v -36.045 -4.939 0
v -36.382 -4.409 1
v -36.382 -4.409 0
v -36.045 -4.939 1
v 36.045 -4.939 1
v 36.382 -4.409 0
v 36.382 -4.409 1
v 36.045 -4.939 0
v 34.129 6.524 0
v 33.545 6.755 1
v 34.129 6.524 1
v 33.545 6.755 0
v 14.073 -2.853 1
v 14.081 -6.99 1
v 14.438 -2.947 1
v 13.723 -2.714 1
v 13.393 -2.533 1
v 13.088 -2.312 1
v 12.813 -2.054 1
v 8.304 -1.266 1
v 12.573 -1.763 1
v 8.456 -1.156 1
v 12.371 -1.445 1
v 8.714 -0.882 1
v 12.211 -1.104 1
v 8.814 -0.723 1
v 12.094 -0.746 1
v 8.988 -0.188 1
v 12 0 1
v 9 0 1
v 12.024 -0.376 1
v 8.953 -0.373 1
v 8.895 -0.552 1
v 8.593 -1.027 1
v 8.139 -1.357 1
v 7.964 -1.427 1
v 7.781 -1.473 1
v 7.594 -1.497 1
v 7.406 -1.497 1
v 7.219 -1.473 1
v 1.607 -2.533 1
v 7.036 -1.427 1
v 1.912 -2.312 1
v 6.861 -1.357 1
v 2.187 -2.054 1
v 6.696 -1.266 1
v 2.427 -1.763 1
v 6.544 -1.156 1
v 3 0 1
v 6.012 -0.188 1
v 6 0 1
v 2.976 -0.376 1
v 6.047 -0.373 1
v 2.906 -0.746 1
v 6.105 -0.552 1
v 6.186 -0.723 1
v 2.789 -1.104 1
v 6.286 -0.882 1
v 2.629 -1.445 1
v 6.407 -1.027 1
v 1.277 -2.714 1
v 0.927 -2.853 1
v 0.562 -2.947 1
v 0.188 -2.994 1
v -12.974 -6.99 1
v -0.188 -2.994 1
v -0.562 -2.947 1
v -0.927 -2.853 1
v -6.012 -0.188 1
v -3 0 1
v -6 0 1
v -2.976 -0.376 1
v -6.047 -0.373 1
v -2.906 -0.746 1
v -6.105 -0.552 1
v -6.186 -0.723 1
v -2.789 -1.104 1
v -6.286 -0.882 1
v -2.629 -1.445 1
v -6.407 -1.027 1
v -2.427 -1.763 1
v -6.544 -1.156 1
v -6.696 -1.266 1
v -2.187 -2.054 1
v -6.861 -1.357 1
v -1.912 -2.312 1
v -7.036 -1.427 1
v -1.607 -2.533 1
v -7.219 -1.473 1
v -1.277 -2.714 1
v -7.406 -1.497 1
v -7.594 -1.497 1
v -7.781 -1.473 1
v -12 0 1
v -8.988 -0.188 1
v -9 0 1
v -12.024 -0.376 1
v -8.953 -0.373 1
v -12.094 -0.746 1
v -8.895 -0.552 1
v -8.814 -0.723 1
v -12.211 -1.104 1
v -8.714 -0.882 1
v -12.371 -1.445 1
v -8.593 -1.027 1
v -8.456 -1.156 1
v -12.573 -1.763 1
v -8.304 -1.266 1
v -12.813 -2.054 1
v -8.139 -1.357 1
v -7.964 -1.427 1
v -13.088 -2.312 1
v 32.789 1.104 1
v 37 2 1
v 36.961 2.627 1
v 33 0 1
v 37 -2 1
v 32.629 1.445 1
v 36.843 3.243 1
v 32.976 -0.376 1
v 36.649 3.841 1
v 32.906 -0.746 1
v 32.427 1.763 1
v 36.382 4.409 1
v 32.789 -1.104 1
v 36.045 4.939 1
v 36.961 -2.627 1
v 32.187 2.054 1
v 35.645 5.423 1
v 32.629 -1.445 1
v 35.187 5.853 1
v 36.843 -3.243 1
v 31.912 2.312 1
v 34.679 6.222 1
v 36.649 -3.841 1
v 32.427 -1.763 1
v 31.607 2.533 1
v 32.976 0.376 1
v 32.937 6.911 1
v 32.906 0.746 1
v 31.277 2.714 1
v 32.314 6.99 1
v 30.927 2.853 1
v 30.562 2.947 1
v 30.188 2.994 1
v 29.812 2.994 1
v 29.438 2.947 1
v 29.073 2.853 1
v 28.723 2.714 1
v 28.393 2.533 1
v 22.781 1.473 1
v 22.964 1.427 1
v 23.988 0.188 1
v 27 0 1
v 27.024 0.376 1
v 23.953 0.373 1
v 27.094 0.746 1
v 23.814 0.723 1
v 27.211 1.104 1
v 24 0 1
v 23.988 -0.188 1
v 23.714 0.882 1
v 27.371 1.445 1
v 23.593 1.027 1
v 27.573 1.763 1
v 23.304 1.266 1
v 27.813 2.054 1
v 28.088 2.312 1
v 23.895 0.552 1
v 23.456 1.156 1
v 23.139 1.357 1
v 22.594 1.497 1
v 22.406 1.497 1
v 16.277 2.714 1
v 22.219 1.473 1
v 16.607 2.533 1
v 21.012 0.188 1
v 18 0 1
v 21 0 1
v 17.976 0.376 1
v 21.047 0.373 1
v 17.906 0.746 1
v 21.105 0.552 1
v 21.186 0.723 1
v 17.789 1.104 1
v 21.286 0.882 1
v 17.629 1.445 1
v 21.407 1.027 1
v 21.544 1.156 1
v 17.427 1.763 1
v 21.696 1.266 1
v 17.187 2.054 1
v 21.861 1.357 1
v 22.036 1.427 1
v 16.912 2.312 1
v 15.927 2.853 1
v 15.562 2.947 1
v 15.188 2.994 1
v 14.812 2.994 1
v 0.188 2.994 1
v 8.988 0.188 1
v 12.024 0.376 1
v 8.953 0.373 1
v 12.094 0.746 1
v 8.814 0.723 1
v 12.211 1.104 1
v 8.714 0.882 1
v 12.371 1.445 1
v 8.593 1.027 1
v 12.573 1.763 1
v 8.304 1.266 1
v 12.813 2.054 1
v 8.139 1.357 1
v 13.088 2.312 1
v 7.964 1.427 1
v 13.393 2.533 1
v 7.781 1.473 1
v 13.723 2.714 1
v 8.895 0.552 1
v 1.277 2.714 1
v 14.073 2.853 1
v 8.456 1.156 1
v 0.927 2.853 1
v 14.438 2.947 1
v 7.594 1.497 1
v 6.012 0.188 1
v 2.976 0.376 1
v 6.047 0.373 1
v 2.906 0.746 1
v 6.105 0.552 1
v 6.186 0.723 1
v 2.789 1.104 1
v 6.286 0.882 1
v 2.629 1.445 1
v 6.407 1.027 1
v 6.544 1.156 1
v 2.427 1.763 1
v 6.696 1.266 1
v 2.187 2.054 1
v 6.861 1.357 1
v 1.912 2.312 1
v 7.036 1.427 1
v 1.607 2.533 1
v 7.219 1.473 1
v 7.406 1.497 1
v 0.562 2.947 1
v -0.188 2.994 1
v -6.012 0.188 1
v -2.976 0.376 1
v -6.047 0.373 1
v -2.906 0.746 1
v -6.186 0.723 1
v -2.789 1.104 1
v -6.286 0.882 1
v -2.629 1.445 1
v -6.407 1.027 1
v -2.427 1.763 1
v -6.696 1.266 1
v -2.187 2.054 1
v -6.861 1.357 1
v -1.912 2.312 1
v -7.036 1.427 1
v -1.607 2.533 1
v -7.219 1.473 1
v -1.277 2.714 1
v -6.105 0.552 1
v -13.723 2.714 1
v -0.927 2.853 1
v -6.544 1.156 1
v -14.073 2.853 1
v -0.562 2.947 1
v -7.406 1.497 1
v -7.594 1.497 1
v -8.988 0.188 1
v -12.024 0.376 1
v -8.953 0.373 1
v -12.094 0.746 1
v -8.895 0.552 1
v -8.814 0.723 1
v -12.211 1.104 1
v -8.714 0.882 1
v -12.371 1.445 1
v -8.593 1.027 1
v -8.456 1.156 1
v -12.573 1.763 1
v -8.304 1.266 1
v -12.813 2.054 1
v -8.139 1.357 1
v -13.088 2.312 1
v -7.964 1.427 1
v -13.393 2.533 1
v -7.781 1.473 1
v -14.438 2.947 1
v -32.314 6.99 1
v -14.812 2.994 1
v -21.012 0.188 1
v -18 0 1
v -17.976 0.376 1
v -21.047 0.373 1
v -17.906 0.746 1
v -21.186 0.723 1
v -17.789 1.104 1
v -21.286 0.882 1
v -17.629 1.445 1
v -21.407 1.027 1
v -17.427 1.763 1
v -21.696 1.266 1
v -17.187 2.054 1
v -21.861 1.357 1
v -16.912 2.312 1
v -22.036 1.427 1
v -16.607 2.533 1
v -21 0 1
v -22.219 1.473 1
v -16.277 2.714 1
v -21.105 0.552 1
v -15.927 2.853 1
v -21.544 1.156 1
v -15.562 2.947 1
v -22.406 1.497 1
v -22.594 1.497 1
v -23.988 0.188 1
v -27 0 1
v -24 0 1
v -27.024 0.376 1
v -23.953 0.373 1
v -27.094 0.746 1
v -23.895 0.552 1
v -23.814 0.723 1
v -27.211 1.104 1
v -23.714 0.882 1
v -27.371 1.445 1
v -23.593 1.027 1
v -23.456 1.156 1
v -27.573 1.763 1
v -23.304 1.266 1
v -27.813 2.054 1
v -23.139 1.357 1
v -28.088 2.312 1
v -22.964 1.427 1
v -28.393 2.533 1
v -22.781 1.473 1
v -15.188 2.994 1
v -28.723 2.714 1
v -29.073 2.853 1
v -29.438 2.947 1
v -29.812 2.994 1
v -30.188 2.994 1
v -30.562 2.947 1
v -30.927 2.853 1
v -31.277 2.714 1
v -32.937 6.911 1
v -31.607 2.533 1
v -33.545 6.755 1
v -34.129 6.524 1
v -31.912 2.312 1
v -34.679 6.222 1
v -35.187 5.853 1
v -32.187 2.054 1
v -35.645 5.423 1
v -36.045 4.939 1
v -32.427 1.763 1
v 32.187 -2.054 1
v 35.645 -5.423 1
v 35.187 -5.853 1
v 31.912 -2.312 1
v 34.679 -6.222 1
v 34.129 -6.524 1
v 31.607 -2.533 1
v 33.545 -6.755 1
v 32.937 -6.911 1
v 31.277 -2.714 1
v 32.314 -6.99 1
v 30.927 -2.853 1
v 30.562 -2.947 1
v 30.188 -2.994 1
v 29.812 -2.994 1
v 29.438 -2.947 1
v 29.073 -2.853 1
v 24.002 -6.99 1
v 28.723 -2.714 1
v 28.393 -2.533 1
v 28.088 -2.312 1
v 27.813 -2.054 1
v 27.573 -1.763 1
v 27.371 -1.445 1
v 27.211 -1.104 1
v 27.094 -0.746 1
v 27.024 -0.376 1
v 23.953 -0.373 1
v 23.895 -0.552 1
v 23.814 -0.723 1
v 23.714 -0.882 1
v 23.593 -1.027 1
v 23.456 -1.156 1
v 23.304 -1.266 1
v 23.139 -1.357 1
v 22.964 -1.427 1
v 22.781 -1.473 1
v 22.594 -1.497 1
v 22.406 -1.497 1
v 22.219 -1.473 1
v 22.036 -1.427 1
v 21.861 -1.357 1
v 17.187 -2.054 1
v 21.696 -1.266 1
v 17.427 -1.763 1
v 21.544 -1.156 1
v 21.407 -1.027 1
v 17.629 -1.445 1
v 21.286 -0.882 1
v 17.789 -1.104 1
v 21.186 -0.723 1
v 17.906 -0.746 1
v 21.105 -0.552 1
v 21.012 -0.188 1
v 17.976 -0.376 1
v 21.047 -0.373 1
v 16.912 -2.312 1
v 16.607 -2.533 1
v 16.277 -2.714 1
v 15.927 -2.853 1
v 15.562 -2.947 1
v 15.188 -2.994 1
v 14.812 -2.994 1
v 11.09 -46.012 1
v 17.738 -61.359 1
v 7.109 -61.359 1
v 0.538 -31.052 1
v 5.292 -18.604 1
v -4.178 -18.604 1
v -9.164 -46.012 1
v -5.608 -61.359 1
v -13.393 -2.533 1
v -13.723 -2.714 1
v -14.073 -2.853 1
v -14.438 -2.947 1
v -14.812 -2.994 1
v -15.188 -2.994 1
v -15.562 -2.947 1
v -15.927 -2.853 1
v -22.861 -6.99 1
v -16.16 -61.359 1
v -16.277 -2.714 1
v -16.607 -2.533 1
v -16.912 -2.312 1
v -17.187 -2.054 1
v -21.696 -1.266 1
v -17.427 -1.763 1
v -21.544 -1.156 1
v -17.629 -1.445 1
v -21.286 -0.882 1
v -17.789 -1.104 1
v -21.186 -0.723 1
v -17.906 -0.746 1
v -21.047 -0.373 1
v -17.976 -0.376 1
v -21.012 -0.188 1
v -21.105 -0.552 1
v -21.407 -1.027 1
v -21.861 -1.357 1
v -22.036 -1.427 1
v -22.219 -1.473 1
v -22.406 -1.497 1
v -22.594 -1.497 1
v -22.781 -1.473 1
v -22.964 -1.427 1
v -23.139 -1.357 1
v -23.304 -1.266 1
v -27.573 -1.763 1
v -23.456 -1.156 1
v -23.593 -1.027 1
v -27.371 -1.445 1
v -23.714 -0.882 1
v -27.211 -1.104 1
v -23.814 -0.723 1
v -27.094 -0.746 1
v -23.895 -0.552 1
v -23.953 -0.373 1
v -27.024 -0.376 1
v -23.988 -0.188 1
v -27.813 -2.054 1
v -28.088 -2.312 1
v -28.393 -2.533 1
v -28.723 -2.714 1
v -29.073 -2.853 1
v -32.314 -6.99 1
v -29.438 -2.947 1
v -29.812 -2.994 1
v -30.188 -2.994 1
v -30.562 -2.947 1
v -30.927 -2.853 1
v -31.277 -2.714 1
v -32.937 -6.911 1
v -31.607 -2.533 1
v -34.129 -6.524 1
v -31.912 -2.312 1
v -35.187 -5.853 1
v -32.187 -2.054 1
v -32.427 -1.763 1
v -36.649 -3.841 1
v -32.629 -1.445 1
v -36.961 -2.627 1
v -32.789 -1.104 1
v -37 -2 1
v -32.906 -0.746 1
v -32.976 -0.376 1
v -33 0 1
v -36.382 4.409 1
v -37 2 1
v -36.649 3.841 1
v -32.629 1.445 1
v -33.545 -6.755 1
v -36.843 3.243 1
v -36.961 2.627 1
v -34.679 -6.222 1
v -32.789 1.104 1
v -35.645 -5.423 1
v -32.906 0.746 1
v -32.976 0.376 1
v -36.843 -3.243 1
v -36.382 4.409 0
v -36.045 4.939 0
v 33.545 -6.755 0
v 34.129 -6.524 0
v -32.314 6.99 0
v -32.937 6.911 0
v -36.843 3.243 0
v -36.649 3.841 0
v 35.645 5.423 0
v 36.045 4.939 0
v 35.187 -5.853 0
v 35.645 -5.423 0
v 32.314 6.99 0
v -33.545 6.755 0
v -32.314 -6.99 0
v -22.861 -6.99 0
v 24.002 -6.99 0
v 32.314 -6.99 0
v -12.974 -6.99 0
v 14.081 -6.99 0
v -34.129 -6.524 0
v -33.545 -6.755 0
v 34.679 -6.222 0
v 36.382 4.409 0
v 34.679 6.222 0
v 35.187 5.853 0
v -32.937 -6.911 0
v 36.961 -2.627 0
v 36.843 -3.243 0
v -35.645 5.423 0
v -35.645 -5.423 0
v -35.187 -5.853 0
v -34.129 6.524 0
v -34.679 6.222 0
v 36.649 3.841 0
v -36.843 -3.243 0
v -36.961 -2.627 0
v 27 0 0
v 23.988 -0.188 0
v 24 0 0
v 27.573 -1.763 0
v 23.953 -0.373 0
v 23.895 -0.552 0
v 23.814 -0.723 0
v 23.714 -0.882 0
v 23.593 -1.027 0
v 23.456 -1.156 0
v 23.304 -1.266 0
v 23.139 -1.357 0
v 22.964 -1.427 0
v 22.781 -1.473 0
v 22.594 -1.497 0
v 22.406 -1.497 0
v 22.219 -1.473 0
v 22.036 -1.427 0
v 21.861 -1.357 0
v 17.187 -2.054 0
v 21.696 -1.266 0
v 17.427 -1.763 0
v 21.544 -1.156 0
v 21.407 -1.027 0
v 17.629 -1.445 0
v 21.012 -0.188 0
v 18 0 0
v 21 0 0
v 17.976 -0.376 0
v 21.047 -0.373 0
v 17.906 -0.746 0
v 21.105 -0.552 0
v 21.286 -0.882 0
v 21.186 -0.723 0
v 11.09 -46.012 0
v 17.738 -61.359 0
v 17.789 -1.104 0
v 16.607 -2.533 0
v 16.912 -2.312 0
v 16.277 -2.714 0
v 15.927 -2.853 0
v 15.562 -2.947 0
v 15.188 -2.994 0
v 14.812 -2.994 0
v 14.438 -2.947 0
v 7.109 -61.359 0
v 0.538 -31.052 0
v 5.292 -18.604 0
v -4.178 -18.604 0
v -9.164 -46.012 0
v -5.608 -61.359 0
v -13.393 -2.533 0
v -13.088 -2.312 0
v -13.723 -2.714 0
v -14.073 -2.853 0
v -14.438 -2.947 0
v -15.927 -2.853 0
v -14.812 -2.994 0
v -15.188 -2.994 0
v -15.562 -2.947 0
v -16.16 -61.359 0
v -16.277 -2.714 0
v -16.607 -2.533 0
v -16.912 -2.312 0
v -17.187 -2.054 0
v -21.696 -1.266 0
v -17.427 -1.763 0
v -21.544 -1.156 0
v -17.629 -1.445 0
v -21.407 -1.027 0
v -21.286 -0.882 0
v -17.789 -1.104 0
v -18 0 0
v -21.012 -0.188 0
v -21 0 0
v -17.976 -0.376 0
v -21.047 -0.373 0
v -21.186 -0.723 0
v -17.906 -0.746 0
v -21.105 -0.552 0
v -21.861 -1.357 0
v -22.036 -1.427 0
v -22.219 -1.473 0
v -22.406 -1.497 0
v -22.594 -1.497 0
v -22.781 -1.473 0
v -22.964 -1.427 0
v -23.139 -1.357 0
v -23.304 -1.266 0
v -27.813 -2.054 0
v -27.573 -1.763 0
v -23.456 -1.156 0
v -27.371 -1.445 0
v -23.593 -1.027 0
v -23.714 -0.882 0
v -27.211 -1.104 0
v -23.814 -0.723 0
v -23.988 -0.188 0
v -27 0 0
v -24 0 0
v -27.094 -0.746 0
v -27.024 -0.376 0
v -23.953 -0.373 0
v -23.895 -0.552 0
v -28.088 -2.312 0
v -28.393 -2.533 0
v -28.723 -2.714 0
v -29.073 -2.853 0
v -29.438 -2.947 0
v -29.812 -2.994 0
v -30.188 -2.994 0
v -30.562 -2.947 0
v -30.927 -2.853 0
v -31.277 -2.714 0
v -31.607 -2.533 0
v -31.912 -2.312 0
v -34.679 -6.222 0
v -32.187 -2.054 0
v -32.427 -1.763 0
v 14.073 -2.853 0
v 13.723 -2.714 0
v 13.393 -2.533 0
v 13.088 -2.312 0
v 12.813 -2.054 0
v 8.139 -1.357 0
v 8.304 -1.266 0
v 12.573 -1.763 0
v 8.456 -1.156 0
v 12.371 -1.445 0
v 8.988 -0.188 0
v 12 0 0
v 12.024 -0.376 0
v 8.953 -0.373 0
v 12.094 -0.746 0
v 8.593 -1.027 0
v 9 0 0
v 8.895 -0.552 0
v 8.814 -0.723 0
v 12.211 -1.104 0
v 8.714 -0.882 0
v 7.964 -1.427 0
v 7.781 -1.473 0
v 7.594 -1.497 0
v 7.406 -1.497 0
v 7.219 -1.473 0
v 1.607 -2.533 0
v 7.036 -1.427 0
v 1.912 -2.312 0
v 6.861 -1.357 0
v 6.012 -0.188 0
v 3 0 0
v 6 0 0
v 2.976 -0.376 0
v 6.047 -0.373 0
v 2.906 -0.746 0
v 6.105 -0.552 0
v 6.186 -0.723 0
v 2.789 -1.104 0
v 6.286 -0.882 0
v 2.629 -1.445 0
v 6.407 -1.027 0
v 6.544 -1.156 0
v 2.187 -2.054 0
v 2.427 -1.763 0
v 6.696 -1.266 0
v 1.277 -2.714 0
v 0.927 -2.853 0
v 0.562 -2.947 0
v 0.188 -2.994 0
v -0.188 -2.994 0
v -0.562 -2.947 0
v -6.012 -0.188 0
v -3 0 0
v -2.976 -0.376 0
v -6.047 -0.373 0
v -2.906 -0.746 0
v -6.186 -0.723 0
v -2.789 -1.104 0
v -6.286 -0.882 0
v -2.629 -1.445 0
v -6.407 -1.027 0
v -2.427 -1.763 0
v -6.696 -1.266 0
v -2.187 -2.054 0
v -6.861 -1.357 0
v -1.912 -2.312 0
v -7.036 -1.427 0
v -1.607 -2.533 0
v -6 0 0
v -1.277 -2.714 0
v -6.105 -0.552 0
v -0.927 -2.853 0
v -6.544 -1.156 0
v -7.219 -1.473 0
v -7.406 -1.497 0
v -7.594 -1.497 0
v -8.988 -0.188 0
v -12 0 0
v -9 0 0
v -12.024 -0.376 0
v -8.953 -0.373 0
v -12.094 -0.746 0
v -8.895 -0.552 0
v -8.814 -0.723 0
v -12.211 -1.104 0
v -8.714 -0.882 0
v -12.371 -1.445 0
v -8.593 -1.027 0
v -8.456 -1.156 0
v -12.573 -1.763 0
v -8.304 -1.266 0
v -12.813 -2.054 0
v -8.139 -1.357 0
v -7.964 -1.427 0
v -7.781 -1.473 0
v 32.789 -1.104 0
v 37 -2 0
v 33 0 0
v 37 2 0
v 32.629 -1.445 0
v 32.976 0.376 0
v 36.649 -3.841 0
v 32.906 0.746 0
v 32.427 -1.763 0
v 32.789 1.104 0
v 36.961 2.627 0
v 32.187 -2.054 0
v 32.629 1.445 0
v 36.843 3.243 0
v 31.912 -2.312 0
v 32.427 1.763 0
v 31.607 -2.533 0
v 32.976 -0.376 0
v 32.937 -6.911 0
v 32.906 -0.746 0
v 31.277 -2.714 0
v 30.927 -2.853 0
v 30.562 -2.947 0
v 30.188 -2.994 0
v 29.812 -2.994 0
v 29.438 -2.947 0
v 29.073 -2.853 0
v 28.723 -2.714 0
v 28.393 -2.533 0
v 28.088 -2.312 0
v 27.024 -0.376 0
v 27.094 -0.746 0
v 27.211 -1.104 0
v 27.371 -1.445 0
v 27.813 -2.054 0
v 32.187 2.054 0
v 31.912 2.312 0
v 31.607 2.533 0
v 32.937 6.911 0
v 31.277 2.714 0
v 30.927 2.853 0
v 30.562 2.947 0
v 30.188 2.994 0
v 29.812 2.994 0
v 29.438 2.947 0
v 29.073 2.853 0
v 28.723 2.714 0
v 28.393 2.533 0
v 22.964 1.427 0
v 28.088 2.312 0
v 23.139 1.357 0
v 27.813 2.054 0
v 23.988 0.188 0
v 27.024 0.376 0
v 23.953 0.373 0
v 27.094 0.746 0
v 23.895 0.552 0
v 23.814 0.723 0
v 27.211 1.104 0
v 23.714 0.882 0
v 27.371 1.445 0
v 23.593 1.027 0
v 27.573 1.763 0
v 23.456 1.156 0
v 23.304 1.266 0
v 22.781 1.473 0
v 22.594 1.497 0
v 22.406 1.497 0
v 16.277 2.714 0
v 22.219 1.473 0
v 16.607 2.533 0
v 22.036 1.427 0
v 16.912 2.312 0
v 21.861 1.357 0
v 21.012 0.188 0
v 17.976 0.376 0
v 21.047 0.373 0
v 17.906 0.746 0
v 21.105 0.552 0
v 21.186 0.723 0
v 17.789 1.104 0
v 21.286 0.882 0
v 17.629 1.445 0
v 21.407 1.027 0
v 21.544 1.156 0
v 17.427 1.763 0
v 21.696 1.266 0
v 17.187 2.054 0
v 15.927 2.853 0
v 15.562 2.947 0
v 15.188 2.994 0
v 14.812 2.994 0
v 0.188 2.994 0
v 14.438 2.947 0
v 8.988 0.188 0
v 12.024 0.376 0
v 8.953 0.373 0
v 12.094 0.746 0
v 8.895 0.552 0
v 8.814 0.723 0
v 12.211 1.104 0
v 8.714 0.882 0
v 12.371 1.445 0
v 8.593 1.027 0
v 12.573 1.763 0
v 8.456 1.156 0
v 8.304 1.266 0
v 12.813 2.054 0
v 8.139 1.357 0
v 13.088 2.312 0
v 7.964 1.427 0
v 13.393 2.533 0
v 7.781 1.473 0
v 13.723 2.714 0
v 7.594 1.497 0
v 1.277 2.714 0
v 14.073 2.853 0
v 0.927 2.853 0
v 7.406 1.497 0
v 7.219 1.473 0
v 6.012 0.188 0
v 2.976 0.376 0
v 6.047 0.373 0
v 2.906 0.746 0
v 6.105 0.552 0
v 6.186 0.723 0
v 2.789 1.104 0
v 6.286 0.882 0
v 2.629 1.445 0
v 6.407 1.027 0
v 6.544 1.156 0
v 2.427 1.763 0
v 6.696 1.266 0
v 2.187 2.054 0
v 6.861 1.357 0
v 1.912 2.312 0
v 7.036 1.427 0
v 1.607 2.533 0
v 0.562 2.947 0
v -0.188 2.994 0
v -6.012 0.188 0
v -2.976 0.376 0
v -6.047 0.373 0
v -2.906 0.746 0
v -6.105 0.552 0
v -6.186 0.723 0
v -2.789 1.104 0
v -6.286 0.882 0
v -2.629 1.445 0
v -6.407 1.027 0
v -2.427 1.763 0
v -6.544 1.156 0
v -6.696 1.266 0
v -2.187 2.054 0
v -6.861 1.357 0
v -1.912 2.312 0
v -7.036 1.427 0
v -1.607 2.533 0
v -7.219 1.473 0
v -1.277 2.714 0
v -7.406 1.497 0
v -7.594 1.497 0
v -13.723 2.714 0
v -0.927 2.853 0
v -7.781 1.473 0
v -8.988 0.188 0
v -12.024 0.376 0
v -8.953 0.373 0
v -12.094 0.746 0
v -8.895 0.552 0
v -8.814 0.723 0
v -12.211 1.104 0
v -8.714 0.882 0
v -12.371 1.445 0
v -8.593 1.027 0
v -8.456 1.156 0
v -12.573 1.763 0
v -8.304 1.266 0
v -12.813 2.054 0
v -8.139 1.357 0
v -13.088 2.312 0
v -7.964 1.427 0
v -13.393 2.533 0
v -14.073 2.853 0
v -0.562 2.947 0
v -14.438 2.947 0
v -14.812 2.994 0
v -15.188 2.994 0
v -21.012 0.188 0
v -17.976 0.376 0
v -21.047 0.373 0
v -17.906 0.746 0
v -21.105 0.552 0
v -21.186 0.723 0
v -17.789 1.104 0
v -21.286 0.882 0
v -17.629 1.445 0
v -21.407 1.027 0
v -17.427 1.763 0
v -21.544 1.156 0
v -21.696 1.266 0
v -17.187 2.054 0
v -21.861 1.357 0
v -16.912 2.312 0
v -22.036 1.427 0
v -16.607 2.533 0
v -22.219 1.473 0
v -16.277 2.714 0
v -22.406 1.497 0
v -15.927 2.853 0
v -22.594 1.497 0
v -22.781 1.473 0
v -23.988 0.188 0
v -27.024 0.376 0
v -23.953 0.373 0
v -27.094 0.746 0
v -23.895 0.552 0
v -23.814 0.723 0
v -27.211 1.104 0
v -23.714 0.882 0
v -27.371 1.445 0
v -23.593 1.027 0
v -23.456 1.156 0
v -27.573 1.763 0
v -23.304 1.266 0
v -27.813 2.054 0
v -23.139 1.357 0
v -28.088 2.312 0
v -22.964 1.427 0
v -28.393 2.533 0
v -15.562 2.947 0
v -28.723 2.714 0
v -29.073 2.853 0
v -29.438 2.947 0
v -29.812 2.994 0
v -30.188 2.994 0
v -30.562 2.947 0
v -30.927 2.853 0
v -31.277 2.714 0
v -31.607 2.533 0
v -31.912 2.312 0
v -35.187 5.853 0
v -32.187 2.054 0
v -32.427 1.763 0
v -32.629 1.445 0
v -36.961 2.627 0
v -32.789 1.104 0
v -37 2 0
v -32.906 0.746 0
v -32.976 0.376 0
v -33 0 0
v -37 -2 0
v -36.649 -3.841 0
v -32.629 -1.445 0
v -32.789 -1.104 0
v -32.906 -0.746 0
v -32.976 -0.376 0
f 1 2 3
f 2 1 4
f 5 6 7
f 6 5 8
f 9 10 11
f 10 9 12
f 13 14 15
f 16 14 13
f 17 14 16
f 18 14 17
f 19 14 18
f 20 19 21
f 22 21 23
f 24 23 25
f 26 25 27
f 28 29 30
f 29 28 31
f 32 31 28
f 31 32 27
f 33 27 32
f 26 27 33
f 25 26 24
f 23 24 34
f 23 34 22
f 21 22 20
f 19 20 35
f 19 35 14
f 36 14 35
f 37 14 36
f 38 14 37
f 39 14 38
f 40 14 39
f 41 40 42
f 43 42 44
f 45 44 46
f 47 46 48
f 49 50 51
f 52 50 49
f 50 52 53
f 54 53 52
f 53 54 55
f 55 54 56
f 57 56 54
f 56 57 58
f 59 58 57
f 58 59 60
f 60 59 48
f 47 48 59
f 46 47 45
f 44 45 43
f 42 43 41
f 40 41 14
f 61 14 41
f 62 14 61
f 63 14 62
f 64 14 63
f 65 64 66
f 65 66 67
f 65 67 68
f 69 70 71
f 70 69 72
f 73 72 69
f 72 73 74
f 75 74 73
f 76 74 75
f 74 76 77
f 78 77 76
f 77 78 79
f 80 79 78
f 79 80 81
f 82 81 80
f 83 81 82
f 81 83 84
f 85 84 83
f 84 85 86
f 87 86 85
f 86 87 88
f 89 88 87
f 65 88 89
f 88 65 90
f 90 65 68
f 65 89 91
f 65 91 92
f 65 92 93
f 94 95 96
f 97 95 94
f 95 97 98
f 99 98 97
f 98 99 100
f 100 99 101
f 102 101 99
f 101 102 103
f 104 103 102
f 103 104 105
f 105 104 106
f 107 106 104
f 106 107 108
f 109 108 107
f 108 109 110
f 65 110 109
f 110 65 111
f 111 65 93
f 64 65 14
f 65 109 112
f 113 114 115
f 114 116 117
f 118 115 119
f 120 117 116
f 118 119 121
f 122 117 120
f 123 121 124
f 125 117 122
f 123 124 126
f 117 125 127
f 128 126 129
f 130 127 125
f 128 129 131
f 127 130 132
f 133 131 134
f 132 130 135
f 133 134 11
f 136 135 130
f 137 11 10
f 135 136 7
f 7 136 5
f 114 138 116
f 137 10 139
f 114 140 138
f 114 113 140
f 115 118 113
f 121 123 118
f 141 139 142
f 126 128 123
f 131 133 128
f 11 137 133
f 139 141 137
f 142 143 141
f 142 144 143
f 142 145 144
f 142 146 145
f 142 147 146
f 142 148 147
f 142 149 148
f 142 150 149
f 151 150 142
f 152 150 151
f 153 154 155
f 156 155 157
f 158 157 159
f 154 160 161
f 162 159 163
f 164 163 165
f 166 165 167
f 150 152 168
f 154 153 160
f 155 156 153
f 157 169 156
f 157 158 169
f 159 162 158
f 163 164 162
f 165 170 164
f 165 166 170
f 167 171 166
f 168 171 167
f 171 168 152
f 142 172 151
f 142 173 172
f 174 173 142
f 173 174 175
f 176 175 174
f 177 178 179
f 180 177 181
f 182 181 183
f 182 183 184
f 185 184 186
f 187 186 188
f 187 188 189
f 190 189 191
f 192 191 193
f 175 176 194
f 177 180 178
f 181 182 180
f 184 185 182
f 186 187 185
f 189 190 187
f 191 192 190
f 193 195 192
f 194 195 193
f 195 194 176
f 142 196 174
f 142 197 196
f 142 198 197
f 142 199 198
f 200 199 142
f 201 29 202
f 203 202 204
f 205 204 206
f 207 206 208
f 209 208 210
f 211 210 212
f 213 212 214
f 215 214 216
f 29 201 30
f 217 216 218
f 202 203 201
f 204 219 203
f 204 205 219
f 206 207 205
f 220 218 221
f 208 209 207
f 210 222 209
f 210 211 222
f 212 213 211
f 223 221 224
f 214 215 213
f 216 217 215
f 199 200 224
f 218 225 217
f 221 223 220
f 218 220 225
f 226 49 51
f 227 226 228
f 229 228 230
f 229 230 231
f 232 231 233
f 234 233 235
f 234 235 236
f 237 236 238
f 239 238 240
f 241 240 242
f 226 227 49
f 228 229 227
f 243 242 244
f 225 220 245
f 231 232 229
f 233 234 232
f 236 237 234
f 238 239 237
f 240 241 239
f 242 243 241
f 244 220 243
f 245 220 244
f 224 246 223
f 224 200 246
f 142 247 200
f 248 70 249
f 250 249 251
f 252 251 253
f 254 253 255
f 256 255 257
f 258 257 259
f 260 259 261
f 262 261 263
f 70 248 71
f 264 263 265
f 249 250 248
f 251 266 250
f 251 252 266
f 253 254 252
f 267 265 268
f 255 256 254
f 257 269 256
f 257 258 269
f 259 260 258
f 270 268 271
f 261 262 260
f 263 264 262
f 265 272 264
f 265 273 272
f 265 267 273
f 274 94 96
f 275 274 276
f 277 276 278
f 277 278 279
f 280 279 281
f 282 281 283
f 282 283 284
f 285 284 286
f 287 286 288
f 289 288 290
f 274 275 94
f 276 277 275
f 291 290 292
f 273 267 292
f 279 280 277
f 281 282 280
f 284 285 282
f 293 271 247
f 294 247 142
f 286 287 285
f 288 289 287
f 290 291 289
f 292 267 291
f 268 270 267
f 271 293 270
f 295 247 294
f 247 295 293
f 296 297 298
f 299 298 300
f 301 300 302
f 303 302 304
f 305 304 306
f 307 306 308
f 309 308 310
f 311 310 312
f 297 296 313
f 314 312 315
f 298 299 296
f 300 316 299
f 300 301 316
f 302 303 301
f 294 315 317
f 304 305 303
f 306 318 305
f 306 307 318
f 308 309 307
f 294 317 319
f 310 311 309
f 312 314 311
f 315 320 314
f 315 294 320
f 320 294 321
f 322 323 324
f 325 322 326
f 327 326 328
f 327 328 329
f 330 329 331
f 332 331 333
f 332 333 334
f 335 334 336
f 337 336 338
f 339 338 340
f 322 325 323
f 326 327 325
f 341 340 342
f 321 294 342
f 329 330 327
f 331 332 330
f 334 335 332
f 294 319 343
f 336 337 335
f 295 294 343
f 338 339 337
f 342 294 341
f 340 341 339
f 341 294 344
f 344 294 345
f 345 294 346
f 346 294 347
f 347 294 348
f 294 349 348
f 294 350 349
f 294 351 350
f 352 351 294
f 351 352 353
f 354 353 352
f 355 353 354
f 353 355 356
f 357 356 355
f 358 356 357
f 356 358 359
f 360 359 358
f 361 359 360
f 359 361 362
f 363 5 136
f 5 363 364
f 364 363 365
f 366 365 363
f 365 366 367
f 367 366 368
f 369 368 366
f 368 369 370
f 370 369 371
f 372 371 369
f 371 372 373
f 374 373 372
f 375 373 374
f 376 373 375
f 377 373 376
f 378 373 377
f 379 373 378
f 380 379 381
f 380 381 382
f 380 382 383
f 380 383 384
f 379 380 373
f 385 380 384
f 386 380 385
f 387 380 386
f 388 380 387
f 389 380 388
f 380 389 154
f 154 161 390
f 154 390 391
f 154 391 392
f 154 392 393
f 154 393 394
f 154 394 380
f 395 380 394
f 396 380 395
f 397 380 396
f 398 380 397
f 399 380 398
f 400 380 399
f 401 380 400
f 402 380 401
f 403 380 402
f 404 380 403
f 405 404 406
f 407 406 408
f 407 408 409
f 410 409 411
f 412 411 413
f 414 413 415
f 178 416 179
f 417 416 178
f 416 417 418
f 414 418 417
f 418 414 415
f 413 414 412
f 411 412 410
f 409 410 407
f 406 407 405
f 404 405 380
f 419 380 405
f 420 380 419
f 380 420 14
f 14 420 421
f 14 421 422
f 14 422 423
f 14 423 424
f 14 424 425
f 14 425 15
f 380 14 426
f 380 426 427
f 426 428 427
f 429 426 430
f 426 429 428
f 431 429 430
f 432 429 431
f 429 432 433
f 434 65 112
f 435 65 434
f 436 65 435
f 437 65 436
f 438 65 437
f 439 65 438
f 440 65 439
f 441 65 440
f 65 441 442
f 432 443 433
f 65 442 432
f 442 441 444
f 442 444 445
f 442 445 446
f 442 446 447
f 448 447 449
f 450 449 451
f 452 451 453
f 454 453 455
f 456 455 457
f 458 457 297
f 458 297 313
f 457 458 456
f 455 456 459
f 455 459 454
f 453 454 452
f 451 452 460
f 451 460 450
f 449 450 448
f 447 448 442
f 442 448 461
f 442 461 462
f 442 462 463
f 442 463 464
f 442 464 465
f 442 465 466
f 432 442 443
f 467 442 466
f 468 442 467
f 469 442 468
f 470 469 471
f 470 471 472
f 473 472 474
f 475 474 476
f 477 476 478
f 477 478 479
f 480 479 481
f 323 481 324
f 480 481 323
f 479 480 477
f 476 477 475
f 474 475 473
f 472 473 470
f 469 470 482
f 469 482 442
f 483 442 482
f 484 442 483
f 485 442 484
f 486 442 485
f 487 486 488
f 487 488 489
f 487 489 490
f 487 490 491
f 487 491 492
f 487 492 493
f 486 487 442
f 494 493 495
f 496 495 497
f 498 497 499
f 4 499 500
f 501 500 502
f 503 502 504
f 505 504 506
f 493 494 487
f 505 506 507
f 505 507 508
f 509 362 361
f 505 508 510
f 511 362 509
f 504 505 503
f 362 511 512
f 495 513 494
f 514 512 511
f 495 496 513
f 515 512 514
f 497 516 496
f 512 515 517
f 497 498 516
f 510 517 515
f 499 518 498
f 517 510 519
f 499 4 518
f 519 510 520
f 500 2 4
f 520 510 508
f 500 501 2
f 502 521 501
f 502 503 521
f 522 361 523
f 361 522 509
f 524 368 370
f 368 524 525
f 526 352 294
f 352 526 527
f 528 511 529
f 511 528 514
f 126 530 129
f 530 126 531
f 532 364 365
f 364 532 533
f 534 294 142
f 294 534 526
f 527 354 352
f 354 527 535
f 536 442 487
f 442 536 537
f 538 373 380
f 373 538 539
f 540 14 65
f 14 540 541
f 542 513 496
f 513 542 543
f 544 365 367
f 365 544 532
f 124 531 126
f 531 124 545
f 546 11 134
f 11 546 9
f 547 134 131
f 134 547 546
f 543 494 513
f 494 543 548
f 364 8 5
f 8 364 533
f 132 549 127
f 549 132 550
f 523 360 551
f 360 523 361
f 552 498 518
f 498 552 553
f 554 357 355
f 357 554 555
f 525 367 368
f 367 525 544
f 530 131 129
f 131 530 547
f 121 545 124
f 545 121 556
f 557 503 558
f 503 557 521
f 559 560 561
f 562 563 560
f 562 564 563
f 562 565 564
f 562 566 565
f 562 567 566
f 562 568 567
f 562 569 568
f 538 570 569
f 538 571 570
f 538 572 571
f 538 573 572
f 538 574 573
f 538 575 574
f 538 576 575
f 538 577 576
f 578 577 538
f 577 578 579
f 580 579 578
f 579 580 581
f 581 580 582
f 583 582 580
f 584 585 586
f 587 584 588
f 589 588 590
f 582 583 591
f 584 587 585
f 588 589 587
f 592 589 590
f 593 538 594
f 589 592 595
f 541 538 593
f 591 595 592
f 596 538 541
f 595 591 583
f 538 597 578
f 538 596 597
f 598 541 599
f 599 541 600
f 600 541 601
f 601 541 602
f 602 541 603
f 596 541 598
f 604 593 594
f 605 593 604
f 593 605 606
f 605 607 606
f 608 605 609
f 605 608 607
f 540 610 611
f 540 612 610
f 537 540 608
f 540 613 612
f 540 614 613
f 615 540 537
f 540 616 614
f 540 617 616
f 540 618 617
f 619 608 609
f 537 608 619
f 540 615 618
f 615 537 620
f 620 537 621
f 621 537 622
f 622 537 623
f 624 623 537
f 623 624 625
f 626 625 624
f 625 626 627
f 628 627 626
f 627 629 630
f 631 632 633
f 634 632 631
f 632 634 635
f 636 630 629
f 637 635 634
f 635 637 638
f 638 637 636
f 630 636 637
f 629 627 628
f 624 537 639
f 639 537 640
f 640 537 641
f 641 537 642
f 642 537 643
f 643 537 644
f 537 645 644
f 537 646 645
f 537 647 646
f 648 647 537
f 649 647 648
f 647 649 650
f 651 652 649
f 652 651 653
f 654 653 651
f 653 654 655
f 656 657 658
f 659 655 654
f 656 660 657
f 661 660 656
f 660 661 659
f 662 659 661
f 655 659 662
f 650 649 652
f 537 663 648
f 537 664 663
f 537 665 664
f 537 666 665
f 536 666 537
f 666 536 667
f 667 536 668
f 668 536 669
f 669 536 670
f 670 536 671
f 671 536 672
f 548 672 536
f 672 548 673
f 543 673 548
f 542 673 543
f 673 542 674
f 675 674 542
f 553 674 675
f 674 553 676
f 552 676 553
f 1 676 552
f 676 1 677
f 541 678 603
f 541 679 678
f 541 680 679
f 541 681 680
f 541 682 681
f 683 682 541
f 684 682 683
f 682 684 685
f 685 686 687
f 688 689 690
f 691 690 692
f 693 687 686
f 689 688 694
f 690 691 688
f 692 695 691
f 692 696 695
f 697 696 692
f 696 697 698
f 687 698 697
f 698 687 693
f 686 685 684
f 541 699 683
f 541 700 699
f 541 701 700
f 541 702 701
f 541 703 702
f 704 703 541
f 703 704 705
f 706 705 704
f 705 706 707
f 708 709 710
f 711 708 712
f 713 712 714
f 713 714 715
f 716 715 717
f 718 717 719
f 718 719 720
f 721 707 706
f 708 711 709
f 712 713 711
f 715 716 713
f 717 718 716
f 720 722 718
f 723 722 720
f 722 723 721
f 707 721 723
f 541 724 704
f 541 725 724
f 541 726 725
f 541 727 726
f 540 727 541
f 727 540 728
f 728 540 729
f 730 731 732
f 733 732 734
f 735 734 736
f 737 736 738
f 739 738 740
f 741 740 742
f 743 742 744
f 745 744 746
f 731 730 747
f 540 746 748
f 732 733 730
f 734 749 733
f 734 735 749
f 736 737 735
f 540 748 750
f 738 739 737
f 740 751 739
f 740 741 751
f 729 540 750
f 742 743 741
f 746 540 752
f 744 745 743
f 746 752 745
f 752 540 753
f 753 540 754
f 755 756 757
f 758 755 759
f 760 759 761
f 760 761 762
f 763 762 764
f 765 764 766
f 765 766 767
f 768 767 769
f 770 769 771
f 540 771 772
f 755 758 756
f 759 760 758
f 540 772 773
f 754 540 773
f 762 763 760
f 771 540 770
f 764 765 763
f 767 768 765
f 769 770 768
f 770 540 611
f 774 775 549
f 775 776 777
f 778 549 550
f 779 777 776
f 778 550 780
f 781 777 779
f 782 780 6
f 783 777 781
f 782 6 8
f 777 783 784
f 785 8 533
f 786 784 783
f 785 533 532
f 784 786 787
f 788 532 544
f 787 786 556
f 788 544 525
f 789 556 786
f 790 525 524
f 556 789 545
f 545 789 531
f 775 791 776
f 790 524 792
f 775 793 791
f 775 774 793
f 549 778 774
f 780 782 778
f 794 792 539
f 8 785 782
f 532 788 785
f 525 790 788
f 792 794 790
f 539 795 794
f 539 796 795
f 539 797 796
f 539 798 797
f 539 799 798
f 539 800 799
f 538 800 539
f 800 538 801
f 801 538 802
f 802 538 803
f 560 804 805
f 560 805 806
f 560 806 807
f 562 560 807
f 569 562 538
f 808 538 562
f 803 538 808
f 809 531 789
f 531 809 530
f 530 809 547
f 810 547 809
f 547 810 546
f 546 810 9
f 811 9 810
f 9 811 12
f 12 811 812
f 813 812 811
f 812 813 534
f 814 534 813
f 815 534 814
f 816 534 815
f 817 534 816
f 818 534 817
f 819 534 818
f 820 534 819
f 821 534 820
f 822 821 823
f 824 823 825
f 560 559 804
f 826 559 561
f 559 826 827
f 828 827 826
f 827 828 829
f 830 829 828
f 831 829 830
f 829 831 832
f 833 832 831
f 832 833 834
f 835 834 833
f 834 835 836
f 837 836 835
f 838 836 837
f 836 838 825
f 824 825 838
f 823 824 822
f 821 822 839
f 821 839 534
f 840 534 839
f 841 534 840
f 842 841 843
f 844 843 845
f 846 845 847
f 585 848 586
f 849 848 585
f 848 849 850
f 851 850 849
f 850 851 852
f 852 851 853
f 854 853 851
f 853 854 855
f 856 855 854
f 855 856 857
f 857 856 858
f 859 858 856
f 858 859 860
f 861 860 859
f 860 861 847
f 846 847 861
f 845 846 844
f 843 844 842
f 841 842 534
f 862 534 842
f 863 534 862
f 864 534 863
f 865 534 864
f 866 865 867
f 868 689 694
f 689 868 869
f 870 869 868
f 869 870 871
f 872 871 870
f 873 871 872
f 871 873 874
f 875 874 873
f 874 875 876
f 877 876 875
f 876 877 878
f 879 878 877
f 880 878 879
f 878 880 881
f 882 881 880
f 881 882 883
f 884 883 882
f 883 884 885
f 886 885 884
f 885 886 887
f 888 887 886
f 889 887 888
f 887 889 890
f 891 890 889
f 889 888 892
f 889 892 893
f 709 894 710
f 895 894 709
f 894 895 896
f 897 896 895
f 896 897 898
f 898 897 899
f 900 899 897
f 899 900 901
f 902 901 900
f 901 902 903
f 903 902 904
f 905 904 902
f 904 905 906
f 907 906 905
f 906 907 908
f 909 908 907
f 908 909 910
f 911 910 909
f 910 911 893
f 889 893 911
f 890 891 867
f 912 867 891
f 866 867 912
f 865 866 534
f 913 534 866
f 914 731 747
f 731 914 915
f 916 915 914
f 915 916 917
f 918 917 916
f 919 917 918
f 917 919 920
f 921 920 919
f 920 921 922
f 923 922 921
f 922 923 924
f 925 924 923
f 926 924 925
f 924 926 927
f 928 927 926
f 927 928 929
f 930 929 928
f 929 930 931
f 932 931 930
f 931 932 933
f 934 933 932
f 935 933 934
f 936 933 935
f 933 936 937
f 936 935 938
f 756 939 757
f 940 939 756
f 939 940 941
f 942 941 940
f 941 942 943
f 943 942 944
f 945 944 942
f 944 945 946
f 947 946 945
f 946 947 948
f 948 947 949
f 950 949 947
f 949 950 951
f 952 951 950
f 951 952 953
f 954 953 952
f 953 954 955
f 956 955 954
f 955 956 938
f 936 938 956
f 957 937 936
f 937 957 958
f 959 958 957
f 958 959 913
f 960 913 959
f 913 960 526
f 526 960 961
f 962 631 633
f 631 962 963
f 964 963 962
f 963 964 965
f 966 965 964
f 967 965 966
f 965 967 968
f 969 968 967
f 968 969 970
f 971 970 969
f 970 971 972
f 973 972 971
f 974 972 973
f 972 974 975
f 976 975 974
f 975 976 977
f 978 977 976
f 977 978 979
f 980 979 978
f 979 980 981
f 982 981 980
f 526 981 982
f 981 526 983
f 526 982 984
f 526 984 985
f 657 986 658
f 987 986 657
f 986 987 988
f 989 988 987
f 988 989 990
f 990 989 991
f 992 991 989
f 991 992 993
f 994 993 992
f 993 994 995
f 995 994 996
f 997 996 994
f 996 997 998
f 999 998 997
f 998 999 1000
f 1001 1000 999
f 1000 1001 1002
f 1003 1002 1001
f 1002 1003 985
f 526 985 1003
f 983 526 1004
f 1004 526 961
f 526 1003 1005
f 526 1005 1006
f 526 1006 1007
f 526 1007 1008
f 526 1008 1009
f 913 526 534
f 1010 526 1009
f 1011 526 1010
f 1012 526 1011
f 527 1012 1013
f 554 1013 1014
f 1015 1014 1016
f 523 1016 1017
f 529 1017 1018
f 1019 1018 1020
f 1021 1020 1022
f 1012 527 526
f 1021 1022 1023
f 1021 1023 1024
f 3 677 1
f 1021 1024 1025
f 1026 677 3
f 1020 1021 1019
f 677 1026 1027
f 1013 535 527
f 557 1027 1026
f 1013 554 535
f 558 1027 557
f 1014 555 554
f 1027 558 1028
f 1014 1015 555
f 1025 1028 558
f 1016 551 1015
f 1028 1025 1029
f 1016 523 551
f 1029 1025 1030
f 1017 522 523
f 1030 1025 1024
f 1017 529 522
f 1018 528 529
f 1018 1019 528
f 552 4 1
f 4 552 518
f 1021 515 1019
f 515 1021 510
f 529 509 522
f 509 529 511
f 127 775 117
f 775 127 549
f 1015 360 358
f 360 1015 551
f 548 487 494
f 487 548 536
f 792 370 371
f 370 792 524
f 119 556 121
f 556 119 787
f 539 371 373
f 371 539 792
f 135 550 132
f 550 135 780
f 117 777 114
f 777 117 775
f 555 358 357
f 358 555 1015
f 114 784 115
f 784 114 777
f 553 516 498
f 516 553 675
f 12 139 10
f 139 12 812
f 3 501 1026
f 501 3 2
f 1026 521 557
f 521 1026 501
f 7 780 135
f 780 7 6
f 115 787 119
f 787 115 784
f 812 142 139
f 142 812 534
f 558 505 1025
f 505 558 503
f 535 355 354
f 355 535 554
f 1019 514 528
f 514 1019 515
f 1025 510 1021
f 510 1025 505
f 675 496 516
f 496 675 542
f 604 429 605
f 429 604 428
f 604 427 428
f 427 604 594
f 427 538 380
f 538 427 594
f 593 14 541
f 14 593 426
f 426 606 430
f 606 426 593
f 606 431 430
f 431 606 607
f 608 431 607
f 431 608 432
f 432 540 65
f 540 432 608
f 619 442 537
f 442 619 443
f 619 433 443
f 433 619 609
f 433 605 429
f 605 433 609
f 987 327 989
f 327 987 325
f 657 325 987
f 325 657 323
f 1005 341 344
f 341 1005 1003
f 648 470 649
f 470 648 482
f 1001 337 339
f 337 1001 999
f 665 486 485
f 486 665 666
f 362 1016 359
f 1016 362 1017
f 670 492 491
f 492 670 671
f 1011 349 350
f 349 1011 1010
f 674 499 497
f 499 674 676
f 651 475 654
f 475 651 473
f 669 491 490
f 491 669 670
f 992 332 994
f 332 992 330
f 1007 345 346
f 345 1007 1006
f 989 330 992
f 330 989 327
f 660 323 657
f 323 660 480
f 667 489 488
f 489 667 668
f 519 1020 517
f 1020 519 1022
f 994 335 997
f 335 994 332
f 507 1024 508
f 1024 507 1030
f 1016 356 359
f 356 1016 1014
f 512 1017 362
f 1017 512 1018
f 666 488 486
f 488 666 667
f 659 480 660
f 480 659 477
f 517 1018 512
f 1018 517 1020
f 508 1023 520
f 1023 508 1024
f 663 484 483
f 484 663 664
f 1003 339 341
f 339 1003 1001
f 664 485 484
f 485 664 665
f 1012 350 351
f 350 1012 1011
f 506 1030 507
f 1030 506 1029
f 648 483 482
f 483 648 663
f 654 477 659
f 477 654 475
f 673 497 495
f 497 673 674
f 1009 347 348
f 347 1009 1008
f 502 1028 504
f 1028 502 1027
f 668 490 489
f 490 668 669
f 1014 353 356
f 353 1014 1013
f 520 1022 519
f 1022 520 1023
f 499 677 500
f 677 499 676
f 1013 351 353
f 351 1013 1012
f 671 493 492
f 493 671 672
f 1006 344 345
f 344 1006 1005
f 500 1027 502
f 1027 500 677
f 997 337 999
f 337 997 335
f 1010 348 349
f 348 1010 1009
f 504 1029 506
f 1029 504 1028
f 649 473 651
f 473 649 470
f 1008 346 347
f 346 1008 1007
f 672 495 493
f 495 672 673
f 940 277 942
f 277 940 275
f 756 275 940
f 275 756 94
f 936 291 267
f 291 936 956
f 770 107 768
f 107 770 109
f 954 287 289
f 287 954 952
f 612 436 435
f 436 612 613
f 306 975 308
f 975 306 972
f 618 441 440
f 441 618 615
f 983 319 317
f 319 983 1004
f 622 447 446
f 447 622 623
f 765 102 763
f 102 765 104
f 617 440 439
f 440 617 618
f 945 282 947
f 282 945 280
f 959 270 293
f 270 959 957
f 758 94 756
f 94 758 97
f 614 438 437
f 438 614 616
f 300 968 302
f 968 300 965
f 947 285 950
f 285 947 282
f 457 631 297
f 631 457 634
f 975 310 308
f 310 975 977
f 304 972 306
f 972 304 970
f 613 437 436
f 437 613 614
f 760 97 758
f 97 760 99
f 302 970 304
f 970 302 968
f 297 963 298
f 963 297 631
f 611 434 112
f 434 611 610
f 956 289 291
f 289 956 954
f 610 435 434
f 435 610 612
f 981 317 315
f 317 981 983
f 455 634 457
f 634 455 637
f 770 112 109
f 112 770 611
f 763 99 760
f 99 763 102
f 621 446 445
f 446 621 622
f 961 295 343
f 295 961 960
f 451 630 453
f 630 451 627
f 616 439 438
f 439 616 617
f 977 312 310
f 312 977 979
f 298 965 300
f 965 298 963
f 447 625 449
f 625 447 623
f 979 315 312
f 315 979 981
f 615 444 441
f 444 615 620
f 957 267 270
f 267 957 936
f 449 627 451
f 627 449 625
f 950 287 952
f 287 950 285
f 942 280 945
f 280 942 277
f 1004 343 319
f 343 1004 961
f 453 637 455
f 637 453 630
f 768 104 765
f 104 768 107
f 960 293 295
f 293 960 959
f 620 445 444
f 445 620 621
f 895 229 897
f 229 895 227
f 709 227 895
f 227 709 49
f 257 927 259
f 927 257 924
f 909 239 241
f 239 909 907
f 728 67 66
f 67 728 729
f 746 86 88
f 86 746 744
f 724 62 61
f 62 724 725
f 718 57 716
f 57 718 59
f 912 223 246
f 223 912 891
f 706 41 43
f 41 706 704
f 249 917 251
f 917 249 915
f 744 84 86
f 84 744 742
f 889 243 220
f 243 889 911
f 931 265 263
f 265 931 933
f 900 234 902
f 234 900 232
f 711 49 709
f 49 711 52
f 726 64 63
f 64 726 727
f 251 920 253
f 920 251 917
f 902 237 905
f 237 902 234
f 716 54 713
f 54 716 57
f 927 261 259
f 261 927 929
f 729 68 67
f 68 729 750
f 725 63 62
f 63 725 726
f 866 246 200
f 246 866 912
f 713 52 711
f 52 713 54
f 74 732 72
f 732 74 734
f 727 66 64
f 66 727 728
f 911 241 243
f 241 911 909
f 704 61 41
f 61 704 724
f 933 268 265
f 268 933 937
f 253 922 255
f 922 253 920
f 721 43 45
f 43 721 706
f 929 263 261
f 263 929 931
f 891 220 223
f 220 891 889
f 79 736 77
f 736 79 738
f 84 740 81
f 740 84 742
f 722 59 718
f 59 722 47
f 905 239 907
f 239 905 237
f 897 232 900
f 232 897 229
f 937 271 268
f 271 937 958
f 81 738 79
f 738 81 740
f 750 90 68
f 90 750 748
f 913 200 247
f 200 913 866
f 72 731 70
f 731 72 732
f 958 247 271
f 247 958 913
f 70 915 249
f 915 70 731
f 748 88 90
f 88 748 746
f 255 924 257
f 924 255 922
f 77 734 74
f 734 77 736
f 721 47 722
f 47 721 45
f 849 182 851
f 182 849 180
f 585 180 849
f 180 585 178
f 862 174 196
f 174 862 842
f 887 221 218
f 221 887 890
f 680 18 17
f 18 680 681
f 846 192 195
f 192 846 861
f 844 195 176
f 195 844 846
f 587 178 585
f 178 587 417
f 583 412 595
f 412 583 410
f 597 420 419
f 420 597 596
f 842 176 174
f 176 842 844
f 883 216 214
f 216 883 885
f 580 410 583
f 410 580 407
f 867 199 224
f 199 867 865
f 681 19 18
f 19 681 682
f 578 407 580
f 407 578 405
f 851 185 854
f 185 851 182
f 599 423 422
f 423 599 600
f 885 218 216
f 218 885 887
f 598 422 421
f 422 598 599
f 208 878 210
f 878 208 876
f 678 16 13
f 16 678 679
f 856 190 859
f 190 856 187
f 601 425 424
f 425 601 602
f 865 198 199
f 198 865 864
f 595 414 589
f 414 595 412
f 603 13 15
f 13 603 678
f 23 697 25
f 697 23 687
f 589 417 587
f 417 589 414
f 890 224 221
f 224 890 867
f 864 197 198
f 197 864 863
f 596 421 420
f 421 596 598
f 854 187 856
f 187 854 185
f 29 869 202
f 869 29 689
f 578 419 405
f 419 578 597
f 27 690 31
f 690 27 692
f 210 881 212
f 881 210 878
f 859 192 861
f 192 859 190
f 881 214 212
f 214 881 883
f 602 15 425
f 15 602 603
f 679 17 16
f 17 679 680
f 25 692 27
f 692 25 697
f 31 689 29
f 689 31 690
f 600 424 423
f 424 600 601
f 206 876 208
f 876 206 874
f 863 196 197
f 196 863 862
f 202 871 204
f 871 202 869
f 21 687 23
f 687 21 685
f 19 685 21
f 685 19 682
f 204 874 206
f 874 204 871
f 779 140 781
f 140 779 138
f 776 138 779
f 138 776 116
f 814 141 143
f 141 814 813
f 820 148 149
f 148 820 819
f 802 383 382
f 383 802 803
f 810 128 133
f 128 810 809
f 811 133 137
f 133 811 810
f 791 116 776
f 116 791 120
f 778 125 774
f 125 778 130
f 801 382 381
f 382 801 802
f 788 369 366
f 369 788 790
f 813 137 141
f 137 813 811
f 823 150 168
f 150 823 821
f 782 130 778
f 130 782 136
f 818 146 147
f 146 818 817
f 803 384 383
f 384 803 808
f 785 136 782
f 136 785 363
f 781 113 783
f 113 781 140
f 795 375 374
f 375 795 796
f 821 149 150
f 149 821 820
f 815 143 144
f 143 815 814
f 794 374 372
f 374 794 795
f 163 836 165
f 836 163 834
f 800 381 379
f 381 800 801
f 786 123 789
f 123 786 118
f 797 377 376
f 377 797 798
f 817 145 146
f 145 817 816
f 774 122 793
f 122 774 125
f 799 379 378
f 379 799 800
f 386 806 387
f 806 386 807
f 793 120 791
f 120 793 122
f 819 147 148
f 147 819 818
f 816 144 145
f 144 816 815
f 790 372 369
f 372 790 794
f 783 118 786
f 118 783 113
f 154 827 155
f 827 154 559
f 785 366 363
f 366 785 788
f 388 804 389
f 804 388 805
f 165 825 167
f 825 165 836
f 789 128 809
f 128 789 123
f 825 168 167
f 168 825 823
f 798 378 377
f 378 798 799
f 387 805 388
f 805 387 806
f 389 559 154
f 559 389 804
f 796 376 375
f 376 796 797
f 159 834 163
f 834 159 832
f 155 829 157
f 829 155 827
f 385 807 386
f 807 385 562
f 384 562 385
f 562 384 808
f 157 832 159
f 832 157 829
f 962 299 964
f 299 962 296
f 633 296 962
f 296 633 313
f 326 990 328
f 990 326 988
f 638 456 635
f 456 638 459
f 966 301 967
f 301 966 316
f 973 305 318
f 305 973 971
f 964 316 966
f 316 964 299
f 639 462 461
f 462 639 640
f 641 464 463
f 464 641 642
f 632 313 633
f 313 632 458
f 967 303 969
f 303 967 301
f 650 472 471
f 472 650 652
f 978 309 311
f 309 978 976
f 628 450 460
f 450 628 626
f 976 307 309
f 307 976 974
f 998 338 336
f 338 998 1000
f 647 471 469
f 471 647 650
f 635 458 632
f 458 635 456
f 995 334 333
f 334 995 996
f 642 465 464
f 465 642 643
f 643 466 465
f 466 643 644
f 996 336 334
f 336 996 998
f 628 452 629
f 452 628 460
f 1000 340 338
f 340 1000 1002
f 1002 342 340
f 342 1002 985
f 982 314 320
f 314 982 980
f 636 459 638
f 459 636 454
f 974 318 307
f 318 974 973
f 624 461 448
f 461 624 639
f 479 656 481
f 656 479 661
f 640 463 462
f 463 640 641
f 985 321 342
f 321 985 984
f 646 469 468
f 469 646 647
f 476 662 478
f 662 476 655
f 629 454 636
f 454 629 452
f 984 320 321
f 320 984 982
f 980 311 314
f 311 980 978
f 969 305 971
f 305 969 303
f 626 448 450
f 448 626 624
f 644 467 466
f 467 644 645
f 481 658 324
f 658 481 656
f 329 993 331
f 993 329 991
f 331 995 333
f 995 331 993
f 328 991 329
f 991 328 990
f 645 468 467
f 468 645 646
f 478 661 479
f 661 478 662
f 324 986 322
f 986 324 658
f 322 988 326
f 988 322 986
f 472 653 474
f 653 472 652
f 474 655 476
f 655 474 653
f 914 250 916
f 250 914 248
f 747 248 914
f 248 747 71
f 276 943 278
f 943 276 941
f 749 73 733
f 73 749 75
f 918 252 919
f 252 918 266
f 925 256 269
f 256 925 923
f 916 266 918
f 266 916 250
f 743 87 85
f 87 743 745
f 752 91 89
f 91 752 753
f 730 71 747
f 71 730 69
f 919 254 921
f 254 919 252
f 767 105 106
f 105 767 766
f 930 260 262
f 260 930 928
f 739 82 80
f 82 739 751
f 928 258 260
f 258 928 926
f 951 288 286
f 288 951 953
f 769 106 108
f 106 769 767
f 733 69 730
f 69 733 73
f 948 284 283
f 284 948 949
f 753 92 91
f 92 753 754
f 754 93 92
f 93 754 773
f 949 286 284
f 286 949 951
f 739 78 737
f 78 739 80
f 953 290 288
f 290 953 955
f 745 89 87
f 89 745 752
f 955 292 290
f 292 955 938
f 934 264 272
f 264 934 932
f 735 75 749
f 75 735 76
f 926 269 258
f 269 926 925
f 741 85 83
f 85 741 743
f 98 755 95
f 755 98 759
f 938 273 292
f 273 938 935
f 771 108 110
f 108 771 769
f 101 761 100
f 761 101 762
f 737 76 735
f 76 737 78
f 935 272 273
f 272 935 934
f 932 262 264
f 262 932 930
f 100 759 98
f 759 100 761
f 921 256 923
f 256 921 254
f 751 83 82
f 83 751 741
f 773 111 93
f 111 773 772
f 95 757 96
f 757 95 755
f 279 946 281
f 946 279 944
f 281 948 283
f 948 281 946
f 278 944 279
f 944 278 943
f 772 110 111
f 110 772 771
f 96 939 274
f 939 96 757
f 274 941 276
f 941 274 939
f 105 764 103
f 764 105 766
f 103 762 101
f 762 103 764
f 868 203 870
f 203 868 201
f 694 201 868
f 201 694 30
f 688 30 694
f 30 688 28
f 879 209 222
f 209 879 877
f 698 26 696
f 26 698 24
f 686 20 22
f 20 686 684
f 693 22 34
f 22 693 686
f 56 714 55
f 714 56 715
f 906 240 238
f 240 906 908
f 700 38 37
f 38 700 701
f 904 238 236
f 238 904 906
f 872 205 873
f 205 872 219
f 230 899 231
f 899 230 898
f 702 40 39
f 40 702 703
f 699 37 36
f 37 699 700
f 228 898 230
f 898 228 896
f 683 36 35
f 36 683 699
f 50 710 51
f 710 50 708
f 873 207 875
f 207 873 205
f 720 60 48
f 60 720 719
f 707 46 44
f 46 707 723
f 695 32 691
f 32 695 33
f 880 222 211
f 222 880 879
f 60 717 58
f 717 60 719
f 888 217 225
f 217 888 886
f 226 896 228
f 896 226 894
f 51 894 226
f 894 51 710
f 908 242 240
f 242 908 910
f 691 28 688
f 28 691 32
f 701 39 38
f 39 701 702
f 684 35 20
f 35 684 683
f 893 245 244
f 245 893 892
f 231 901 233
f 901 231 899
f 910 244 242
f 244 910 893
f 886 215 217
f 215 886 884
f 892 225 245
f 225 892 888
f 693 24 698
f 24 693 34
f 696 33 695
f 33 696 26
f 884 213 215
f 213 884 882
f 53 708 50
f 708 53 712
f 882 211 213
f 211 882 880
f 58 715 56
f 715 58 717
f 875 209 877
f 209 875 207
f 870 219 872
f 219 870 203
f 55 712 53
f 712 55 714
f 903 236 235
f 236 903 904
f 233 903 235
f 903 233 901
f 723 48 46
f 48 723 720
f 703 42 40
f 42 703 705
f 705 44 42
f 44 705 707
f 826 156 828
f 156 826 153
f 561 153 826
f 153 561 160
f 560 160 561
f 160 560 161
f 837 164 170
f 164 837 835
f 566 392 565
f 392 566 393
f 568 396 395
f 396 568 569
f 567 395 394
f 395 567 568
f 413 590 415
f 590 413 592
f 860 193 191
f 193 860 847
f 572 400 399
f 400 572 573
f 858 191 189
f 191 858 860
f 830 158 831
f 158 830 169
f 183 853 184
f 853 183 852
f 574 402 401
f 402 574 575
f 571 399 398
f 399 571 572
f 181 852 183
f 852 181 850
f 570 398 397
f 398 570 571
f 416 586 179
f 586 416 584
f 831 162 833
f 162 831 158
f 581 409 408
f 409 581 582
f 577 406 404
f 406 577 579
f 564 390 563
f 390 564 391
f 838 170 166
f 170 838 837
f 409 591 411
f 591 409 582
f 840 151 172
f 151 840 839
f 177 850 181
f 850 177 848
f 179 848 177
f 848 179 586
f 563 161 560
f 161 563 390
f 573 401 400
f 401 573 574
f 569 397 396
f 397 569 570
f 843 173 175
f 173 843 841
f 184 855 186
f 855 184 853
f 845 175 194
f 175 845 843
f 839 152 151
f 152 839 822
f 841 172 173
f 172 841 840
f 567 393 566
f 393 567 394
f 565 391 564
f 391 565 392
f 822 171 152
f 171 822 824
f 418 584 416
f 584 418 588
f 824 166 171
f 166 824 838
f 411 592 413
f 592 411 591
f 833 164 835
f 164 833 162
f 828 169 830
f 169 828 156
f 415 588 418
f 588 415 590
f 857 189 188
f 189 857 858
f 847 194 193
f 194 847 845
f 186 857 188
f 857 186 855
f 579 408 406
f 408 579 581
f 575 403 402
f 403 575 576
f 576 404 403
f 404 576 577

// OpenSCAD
$fn = 50;


difference() {
	union() {
		hull() {
			translate(v = [-32.0000000000, 2.0000000000, 0]) {
				cylinder(h = 1, r = 5);
			}
			translate(v = [32.0000000000, 2.0000000000, 0]) {
				cylinder(h = 1, r = 5);
			}
			translate(v = [-32.0000000000, -2.0000000000, 0]) {
				cylinder(h = 1, r = 5);
			}
			translate(v = [32.0000000000, -2.0000000000, 0]) {
				cylinder(h = 1, r = 5);
			}
		}
		translate(v = [0, -5, 0]) {
			linear_extrude(height = 1) {
				text(font = "DejaVu Sans Mono:style=Bold", halign = "center", size = 57.0000000000, text = "W", valign = "top");
			}
		}
	}
	union() {
		translate(v = [-30.0000000000, 0.0000000000, 0]) {
			translate(v = [0, 0, -100]) {
				cylinder(h = 200, r = 3.0000000000);
			}
		}
		translate(v = [-15.0000000000, 0.0000000000, 0]) {
			translate(v = [0, 0, -100]) {
				cylinder(h = 200, r = 3.0000000000);
			}
		}
		translate(v = [0, 0, -100]) {
			cylinder(h = 200, r = 3.0000000000);
		}
		translate(v = [15.0000000000, 0.0000000000, 0]) {
			translate(v = [0, 0, -100]) {
				cylinder(h = 200, r = 3.0000000000);
			}
		}
		translate(v = [30.0000000000, 0.0000000000, 0]) {
			translate(v = [0, 0, -100]) {
				cylinder(h = 200, r = 3.0000000000);
			}
		}
		translate(v = [-30.0000000000, 0.0000000000, 0]) {
			translate(v = [0, 0, -100]) {
				cylinder(h = 200, r = 1.5000000000);
			}
		}
		translate(v = [-22.5000000000, 0.0000000000, 0]) {
			translate(v = [0, 0, -100]) {
				cylinder(h = 200, r = 1.5000000000);
			}
		}
		translate(v = [-15.0000000000, 0.0000000000, 0]) {
			translate(v = [0, 0, -100]) {
				cylinder(h = 200, r = 1.5000000000);
			}
		}
		translate(v = [-7.5000000000, 0.0000000000, 0]) {
			translate(v = [0, 0, -100]) {
				cylinder(h = 200, r = 1.5000000000);
			}
		}
		translate(v = [0, 0, -100]) {
			cylinder(h = 200, r = 1.5000000000);
		}
		translate(v = [7.5000000000, 0.0000000000, 0]) {
			translate(v = [0, 0, -100]) {
				cylinder(h = 200, r = 1.5000000000);
			}
		}
		translate(v = [15.0000000000, 0.0000000000, 0]) {
			translate(v = [0, 0, -100]) {
				cylinder(h = 200, r = 1.5000000000);
			}
		}
		translate(v = [22.5000000000, 0.0000000000, 0]) {
			translate(v = [0, 0, -100]) {
				cylinder(h = 200, r = 1.5000000000);
			}
		}
		translate(v = [30.0000000000, 0.0000000000, 0]) {
			translate(v = [0, 0, -100]) {
				cylinder(h = 200, r = 1.5000000000);
			}
		}
	}
}
